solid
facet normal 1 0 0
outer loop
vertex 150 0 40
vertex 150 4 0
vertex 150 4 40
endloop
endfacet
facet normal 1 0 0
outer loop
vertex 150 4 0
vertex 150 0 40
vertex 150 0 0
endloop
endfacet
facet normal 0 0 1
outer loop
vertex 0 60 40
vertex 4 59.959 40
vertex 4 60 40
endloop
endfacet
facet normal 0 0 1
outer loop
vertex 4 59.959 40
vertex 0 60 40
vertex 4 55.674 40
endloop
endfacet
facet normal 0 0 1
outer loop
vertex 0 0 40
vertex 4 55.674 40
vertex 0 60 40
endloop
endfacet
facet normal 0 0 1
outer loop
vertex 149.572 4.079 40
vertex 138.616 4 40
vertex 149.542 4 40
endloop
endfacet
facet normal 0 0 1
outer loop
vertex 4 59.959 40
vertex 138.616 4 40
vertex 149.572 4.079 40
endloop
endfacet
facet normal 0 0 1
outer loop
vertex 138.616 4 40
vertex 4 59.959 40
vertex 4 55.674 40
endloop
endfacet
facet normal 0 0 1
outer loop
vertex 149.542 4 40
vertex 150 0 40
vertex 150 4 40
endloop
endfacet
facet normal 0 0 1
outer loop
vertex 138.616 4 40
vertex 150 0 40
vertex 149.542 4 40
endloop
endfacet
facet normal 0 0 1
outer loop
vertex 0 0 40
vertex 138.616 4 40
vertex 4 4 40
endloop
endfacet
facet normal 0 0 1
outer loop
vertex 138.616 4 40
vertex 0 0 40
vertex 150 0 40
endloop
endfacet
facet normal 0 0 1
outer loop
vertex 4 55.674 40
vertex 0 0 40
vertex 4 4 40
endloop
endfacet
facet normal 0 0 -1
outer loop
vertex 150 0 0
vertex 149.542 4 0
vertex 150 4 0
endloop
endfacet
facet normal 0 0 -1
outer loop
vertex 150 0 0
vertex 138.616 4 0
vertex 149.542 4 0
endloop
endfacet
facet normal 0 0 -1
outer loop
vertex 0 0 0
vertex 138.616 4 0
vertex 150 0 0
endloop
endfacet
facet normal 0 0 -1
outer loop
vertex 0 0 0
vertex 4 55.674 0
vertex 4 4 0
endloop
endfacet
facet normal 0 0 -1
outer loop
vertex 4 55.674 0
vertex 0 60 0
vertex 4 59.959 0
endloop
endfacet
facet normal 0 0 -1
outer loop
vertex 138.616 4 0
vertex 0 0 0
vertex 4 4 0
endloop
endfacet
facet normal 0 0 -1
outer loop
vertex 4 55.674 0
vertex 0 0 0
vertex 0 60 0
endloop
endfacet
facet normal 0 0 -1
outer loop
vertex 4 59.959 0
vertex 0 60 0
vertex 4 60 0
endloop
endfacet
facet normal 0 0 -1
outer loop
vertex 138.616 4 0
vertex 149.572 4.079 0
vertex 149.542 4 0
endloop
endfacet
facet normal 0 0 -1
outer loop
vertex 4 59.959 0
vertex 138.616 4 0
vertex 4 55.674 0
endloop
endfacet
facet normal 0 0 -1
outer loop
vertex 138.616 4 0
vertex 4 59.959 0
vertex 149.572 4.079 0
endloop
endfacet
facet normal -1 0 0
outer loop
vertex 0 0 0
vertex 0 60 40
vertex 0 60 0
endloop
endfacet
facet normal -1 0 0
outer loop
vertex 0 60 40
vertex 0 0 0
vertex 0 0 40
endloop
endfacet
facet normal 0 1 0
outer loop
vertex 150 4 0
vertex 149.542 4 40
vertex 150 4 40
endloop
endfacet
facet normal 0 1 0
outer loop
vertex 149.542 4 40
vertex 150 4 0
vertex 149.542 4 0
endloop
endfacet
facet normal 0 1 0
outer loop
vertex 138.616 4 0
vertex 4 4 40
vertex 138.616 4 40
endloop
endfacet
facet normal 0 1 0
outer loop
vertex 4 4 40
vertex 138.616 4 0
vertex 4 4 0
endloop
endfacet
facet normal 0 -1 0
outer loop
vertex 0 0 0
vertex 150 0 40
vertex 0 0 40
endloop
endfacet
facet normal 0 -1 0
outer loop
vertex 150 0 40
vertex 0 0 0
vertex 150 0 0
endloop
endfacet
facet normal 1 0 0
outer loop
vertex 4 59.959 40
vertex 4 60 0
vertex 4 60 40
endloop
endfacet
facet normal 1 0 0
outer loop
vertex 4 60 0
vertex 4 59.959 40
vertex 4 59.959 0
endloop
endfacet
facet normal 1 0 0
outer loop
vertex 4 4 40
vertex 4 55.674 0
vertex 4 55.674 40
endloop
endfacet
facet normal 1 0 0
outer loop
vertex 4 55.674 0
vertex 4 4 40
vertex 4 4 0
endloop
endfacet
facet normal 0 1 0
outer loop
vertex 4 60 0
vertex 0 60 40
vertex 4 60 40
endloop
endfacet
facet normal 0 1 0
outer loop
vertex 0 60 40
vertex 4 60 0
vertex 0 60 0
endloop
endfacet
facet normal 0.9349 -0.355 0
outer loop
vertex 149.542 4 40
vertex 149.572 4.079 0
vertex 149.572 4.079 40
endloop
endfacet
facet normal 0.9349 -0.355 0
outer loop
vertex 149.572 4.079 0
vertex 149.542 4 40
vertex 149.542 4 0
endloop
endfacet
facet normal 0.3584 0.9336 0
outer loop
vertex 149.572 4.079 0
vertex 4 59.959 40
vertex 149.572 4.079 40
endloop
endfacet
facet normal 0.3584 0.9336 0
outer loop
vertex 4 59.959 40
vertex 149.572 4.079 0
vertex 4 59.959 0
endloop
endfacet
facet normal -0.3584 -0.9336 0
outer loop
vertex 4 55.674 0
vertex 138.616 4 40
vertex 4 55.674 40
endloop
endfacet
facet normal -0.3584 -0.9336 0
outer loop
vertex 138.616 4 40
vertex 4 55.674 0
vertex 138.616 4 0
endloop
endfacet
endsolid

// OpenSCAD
cube([150, 4, 40]);
cube([4, 60, 40]);
translate([2.5, 56.25, 0]) rotate([0,0,-21]) cube([156, 4, 40]);
